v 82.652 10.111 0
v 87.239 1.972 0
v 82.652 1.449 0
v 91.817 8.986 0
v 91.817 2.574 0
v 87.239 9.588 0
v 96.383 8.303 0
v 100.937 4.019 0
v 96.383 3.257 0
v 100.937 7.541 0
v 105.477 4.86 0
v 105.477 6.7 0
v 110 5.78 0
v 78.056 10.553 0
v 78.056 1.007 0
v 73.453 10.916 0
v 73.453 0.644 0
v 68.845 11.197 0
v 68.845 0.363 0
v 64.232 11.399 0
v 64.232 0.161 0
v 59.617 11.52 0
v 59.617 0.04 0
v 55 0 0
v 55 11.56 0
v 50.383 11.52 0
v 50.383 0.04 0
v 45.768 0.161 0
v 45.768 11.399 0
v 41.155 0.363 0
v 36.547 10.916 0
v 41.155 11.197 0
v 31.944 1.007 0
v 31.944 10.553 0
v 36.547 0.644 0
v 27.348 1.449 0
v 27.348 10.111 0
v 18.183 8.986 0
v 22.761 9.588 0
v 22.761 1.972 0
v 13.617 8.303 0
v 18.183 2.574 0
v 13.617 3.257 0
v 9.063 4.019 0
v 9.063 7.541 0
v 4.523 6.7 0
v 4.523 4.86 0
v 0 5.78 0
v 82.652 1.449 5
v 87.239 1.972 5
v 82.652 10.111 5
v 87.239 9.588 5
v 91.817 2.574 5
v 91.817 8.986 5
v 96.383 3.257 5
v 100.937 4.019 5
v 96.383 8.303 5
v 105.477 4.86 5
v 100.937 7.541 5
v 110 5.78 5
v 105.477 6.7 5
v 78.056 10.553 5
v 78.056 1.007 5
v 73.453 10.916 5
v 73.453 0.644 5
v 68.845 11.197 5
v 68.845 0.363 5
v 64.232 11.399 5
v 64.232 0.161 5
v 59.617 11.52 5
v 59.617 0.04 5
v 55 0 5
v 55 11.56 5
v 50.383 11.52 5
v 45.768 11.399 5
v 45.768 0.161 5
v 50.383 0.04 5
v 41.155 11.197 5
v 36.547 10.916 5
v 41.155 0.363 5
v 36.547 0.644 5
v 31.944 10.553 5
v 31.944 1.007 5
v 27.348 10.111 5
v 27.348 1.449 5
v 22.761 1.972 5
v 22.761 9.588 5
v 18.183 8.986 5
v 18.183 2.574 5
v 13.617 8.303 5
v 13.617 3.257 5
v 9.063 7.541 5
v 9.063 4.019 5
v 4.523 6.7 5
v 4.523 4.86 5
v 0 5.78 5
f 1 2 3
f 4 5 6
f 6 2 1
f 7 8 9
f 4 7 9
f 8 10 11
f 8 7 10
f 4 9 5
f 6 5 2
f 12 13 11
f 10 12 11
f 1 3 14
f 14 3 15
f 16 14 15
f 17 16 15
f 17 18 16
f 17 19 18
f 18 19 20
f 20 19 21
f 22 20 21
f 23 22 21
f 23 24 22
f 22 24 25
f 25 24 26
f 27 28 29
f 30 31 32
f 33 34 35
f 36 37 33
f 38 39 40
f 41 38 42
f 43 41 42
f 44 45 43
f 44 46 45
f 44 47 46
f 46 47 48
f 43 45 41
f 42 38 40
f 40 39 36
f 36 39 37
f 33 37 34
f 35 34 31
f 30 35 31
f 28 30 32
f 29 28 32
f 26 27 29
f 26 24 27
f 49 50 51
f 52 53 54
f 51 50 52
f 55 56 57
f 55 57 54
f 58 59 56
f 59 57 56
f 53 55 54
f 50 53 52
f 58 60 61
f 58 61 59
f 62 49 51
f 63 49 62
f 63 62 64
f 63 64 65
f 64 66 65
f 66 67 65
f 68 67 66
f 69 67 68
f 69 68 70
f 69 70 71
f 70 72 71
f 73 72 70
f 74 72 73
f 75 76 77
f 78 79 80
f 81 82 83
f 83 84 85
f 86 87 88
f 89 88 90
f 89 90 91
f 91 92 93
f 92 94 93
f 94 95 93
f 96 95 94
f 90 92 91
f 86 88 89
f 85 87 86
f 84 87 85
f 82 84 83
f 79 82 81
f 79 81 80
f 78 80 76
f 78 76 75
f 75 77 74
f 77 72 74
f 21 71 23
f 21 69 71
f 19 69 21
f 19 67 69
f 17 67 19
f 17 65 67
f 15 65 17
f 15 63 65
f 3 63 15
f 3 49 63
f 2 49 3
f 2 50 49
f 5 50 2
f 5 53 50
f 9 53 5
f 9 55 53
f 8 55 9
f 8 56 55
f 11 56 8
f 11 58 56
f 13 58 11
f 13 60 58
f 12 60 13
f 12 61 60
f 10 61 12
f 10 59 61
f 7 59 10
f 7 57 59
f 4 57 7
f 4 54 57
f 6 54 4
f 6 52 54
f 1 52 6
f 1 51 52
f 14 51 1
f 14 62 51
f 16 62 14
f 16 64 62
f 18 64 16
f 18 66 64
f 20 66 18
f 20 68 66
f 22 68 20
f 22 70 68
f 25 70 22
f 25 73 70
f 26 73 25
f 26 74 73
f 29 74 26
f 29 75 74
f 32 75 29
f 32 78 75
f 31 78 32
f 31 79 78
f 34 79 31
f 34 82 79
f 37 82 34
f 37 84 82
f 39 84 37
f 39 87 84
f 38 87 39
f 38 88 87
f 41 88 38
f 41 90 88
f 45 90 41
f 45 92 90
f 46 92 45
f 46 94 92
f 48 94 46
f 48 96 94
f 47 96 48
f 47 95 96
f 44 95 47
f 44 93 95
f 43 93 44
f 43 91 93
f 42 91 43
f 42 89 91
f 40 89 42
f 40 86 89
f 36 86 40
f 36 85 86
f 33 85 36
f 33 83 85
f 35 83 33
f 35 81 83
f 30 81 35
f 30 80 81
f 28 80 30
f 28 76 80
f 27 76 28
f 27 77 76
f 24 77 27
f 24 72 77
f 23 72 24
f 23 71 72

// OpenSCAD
$fn = 32;

// ----------------------------------------------------------------------
// Arc profile plate: lens, 48 points
// ----------------------------------------------------------------------

// --- parameters (mm) ---
lens_chord = 110;         // chord length of the lens, X
arc_r = 264.54;           // radius of both arcs
arc_angle = 24;           // angle of each arc, degrees
sagitta = 5.78;           // bulge of each arc (half the lens height)
arc_step = 1;             // sampling step of the arcs, degrees
plate_t = 5;              // plate thickness, Z

bbox_y = 2 * sagitta;  // full lens height

profile = [[110, 5.78], [105.477, 6.7], [100.937, 7.541], [96.383, 8.303], [91.817, 8.986], [87.239, 9.588], [82.652, 10.111], [78.056, 10.553], [73.453, 10.916], [68.845, 11.197], [64.232, 11.399], [59.617, 11.52], [55, 11.56], [50.383, 11.52], [45.768, 11.399], [41.155, 11.197], [36.547, 10.916], [31.944, 10.553], [27.348, 10.111], [22.761, 9.588], [18.183, 8.986], [13.617, 8.303], [9.063, 7.541], [4.523, 6.7], [0, 5.78], [4.523, 4.86], [9.063, 4.019], [13.617, 3.257], [18.183, 2.574], [22.761, 1.972], [27.348, 1.449], [31.944, 1.007], [36.547, 0.644], [41.155, 0.363], [45.768, 0.161], [50.383, 0.04], [55, 0], [59.617, 0.04], [64.232, 0.161], [68.845, 0.363], [73.453, 0.644], [78.056, 1.007], [82.652, 1.449], [87.239, 1.972], [91.817, 2.574], [96.383, 3.257], [100.937, 4.019], [105.477, 4.86]];  // primary outline, 48 points, counter clockwise

// --- the one profile operation ---
linear_extrude(height = plate_t) polygon(points = profile);
